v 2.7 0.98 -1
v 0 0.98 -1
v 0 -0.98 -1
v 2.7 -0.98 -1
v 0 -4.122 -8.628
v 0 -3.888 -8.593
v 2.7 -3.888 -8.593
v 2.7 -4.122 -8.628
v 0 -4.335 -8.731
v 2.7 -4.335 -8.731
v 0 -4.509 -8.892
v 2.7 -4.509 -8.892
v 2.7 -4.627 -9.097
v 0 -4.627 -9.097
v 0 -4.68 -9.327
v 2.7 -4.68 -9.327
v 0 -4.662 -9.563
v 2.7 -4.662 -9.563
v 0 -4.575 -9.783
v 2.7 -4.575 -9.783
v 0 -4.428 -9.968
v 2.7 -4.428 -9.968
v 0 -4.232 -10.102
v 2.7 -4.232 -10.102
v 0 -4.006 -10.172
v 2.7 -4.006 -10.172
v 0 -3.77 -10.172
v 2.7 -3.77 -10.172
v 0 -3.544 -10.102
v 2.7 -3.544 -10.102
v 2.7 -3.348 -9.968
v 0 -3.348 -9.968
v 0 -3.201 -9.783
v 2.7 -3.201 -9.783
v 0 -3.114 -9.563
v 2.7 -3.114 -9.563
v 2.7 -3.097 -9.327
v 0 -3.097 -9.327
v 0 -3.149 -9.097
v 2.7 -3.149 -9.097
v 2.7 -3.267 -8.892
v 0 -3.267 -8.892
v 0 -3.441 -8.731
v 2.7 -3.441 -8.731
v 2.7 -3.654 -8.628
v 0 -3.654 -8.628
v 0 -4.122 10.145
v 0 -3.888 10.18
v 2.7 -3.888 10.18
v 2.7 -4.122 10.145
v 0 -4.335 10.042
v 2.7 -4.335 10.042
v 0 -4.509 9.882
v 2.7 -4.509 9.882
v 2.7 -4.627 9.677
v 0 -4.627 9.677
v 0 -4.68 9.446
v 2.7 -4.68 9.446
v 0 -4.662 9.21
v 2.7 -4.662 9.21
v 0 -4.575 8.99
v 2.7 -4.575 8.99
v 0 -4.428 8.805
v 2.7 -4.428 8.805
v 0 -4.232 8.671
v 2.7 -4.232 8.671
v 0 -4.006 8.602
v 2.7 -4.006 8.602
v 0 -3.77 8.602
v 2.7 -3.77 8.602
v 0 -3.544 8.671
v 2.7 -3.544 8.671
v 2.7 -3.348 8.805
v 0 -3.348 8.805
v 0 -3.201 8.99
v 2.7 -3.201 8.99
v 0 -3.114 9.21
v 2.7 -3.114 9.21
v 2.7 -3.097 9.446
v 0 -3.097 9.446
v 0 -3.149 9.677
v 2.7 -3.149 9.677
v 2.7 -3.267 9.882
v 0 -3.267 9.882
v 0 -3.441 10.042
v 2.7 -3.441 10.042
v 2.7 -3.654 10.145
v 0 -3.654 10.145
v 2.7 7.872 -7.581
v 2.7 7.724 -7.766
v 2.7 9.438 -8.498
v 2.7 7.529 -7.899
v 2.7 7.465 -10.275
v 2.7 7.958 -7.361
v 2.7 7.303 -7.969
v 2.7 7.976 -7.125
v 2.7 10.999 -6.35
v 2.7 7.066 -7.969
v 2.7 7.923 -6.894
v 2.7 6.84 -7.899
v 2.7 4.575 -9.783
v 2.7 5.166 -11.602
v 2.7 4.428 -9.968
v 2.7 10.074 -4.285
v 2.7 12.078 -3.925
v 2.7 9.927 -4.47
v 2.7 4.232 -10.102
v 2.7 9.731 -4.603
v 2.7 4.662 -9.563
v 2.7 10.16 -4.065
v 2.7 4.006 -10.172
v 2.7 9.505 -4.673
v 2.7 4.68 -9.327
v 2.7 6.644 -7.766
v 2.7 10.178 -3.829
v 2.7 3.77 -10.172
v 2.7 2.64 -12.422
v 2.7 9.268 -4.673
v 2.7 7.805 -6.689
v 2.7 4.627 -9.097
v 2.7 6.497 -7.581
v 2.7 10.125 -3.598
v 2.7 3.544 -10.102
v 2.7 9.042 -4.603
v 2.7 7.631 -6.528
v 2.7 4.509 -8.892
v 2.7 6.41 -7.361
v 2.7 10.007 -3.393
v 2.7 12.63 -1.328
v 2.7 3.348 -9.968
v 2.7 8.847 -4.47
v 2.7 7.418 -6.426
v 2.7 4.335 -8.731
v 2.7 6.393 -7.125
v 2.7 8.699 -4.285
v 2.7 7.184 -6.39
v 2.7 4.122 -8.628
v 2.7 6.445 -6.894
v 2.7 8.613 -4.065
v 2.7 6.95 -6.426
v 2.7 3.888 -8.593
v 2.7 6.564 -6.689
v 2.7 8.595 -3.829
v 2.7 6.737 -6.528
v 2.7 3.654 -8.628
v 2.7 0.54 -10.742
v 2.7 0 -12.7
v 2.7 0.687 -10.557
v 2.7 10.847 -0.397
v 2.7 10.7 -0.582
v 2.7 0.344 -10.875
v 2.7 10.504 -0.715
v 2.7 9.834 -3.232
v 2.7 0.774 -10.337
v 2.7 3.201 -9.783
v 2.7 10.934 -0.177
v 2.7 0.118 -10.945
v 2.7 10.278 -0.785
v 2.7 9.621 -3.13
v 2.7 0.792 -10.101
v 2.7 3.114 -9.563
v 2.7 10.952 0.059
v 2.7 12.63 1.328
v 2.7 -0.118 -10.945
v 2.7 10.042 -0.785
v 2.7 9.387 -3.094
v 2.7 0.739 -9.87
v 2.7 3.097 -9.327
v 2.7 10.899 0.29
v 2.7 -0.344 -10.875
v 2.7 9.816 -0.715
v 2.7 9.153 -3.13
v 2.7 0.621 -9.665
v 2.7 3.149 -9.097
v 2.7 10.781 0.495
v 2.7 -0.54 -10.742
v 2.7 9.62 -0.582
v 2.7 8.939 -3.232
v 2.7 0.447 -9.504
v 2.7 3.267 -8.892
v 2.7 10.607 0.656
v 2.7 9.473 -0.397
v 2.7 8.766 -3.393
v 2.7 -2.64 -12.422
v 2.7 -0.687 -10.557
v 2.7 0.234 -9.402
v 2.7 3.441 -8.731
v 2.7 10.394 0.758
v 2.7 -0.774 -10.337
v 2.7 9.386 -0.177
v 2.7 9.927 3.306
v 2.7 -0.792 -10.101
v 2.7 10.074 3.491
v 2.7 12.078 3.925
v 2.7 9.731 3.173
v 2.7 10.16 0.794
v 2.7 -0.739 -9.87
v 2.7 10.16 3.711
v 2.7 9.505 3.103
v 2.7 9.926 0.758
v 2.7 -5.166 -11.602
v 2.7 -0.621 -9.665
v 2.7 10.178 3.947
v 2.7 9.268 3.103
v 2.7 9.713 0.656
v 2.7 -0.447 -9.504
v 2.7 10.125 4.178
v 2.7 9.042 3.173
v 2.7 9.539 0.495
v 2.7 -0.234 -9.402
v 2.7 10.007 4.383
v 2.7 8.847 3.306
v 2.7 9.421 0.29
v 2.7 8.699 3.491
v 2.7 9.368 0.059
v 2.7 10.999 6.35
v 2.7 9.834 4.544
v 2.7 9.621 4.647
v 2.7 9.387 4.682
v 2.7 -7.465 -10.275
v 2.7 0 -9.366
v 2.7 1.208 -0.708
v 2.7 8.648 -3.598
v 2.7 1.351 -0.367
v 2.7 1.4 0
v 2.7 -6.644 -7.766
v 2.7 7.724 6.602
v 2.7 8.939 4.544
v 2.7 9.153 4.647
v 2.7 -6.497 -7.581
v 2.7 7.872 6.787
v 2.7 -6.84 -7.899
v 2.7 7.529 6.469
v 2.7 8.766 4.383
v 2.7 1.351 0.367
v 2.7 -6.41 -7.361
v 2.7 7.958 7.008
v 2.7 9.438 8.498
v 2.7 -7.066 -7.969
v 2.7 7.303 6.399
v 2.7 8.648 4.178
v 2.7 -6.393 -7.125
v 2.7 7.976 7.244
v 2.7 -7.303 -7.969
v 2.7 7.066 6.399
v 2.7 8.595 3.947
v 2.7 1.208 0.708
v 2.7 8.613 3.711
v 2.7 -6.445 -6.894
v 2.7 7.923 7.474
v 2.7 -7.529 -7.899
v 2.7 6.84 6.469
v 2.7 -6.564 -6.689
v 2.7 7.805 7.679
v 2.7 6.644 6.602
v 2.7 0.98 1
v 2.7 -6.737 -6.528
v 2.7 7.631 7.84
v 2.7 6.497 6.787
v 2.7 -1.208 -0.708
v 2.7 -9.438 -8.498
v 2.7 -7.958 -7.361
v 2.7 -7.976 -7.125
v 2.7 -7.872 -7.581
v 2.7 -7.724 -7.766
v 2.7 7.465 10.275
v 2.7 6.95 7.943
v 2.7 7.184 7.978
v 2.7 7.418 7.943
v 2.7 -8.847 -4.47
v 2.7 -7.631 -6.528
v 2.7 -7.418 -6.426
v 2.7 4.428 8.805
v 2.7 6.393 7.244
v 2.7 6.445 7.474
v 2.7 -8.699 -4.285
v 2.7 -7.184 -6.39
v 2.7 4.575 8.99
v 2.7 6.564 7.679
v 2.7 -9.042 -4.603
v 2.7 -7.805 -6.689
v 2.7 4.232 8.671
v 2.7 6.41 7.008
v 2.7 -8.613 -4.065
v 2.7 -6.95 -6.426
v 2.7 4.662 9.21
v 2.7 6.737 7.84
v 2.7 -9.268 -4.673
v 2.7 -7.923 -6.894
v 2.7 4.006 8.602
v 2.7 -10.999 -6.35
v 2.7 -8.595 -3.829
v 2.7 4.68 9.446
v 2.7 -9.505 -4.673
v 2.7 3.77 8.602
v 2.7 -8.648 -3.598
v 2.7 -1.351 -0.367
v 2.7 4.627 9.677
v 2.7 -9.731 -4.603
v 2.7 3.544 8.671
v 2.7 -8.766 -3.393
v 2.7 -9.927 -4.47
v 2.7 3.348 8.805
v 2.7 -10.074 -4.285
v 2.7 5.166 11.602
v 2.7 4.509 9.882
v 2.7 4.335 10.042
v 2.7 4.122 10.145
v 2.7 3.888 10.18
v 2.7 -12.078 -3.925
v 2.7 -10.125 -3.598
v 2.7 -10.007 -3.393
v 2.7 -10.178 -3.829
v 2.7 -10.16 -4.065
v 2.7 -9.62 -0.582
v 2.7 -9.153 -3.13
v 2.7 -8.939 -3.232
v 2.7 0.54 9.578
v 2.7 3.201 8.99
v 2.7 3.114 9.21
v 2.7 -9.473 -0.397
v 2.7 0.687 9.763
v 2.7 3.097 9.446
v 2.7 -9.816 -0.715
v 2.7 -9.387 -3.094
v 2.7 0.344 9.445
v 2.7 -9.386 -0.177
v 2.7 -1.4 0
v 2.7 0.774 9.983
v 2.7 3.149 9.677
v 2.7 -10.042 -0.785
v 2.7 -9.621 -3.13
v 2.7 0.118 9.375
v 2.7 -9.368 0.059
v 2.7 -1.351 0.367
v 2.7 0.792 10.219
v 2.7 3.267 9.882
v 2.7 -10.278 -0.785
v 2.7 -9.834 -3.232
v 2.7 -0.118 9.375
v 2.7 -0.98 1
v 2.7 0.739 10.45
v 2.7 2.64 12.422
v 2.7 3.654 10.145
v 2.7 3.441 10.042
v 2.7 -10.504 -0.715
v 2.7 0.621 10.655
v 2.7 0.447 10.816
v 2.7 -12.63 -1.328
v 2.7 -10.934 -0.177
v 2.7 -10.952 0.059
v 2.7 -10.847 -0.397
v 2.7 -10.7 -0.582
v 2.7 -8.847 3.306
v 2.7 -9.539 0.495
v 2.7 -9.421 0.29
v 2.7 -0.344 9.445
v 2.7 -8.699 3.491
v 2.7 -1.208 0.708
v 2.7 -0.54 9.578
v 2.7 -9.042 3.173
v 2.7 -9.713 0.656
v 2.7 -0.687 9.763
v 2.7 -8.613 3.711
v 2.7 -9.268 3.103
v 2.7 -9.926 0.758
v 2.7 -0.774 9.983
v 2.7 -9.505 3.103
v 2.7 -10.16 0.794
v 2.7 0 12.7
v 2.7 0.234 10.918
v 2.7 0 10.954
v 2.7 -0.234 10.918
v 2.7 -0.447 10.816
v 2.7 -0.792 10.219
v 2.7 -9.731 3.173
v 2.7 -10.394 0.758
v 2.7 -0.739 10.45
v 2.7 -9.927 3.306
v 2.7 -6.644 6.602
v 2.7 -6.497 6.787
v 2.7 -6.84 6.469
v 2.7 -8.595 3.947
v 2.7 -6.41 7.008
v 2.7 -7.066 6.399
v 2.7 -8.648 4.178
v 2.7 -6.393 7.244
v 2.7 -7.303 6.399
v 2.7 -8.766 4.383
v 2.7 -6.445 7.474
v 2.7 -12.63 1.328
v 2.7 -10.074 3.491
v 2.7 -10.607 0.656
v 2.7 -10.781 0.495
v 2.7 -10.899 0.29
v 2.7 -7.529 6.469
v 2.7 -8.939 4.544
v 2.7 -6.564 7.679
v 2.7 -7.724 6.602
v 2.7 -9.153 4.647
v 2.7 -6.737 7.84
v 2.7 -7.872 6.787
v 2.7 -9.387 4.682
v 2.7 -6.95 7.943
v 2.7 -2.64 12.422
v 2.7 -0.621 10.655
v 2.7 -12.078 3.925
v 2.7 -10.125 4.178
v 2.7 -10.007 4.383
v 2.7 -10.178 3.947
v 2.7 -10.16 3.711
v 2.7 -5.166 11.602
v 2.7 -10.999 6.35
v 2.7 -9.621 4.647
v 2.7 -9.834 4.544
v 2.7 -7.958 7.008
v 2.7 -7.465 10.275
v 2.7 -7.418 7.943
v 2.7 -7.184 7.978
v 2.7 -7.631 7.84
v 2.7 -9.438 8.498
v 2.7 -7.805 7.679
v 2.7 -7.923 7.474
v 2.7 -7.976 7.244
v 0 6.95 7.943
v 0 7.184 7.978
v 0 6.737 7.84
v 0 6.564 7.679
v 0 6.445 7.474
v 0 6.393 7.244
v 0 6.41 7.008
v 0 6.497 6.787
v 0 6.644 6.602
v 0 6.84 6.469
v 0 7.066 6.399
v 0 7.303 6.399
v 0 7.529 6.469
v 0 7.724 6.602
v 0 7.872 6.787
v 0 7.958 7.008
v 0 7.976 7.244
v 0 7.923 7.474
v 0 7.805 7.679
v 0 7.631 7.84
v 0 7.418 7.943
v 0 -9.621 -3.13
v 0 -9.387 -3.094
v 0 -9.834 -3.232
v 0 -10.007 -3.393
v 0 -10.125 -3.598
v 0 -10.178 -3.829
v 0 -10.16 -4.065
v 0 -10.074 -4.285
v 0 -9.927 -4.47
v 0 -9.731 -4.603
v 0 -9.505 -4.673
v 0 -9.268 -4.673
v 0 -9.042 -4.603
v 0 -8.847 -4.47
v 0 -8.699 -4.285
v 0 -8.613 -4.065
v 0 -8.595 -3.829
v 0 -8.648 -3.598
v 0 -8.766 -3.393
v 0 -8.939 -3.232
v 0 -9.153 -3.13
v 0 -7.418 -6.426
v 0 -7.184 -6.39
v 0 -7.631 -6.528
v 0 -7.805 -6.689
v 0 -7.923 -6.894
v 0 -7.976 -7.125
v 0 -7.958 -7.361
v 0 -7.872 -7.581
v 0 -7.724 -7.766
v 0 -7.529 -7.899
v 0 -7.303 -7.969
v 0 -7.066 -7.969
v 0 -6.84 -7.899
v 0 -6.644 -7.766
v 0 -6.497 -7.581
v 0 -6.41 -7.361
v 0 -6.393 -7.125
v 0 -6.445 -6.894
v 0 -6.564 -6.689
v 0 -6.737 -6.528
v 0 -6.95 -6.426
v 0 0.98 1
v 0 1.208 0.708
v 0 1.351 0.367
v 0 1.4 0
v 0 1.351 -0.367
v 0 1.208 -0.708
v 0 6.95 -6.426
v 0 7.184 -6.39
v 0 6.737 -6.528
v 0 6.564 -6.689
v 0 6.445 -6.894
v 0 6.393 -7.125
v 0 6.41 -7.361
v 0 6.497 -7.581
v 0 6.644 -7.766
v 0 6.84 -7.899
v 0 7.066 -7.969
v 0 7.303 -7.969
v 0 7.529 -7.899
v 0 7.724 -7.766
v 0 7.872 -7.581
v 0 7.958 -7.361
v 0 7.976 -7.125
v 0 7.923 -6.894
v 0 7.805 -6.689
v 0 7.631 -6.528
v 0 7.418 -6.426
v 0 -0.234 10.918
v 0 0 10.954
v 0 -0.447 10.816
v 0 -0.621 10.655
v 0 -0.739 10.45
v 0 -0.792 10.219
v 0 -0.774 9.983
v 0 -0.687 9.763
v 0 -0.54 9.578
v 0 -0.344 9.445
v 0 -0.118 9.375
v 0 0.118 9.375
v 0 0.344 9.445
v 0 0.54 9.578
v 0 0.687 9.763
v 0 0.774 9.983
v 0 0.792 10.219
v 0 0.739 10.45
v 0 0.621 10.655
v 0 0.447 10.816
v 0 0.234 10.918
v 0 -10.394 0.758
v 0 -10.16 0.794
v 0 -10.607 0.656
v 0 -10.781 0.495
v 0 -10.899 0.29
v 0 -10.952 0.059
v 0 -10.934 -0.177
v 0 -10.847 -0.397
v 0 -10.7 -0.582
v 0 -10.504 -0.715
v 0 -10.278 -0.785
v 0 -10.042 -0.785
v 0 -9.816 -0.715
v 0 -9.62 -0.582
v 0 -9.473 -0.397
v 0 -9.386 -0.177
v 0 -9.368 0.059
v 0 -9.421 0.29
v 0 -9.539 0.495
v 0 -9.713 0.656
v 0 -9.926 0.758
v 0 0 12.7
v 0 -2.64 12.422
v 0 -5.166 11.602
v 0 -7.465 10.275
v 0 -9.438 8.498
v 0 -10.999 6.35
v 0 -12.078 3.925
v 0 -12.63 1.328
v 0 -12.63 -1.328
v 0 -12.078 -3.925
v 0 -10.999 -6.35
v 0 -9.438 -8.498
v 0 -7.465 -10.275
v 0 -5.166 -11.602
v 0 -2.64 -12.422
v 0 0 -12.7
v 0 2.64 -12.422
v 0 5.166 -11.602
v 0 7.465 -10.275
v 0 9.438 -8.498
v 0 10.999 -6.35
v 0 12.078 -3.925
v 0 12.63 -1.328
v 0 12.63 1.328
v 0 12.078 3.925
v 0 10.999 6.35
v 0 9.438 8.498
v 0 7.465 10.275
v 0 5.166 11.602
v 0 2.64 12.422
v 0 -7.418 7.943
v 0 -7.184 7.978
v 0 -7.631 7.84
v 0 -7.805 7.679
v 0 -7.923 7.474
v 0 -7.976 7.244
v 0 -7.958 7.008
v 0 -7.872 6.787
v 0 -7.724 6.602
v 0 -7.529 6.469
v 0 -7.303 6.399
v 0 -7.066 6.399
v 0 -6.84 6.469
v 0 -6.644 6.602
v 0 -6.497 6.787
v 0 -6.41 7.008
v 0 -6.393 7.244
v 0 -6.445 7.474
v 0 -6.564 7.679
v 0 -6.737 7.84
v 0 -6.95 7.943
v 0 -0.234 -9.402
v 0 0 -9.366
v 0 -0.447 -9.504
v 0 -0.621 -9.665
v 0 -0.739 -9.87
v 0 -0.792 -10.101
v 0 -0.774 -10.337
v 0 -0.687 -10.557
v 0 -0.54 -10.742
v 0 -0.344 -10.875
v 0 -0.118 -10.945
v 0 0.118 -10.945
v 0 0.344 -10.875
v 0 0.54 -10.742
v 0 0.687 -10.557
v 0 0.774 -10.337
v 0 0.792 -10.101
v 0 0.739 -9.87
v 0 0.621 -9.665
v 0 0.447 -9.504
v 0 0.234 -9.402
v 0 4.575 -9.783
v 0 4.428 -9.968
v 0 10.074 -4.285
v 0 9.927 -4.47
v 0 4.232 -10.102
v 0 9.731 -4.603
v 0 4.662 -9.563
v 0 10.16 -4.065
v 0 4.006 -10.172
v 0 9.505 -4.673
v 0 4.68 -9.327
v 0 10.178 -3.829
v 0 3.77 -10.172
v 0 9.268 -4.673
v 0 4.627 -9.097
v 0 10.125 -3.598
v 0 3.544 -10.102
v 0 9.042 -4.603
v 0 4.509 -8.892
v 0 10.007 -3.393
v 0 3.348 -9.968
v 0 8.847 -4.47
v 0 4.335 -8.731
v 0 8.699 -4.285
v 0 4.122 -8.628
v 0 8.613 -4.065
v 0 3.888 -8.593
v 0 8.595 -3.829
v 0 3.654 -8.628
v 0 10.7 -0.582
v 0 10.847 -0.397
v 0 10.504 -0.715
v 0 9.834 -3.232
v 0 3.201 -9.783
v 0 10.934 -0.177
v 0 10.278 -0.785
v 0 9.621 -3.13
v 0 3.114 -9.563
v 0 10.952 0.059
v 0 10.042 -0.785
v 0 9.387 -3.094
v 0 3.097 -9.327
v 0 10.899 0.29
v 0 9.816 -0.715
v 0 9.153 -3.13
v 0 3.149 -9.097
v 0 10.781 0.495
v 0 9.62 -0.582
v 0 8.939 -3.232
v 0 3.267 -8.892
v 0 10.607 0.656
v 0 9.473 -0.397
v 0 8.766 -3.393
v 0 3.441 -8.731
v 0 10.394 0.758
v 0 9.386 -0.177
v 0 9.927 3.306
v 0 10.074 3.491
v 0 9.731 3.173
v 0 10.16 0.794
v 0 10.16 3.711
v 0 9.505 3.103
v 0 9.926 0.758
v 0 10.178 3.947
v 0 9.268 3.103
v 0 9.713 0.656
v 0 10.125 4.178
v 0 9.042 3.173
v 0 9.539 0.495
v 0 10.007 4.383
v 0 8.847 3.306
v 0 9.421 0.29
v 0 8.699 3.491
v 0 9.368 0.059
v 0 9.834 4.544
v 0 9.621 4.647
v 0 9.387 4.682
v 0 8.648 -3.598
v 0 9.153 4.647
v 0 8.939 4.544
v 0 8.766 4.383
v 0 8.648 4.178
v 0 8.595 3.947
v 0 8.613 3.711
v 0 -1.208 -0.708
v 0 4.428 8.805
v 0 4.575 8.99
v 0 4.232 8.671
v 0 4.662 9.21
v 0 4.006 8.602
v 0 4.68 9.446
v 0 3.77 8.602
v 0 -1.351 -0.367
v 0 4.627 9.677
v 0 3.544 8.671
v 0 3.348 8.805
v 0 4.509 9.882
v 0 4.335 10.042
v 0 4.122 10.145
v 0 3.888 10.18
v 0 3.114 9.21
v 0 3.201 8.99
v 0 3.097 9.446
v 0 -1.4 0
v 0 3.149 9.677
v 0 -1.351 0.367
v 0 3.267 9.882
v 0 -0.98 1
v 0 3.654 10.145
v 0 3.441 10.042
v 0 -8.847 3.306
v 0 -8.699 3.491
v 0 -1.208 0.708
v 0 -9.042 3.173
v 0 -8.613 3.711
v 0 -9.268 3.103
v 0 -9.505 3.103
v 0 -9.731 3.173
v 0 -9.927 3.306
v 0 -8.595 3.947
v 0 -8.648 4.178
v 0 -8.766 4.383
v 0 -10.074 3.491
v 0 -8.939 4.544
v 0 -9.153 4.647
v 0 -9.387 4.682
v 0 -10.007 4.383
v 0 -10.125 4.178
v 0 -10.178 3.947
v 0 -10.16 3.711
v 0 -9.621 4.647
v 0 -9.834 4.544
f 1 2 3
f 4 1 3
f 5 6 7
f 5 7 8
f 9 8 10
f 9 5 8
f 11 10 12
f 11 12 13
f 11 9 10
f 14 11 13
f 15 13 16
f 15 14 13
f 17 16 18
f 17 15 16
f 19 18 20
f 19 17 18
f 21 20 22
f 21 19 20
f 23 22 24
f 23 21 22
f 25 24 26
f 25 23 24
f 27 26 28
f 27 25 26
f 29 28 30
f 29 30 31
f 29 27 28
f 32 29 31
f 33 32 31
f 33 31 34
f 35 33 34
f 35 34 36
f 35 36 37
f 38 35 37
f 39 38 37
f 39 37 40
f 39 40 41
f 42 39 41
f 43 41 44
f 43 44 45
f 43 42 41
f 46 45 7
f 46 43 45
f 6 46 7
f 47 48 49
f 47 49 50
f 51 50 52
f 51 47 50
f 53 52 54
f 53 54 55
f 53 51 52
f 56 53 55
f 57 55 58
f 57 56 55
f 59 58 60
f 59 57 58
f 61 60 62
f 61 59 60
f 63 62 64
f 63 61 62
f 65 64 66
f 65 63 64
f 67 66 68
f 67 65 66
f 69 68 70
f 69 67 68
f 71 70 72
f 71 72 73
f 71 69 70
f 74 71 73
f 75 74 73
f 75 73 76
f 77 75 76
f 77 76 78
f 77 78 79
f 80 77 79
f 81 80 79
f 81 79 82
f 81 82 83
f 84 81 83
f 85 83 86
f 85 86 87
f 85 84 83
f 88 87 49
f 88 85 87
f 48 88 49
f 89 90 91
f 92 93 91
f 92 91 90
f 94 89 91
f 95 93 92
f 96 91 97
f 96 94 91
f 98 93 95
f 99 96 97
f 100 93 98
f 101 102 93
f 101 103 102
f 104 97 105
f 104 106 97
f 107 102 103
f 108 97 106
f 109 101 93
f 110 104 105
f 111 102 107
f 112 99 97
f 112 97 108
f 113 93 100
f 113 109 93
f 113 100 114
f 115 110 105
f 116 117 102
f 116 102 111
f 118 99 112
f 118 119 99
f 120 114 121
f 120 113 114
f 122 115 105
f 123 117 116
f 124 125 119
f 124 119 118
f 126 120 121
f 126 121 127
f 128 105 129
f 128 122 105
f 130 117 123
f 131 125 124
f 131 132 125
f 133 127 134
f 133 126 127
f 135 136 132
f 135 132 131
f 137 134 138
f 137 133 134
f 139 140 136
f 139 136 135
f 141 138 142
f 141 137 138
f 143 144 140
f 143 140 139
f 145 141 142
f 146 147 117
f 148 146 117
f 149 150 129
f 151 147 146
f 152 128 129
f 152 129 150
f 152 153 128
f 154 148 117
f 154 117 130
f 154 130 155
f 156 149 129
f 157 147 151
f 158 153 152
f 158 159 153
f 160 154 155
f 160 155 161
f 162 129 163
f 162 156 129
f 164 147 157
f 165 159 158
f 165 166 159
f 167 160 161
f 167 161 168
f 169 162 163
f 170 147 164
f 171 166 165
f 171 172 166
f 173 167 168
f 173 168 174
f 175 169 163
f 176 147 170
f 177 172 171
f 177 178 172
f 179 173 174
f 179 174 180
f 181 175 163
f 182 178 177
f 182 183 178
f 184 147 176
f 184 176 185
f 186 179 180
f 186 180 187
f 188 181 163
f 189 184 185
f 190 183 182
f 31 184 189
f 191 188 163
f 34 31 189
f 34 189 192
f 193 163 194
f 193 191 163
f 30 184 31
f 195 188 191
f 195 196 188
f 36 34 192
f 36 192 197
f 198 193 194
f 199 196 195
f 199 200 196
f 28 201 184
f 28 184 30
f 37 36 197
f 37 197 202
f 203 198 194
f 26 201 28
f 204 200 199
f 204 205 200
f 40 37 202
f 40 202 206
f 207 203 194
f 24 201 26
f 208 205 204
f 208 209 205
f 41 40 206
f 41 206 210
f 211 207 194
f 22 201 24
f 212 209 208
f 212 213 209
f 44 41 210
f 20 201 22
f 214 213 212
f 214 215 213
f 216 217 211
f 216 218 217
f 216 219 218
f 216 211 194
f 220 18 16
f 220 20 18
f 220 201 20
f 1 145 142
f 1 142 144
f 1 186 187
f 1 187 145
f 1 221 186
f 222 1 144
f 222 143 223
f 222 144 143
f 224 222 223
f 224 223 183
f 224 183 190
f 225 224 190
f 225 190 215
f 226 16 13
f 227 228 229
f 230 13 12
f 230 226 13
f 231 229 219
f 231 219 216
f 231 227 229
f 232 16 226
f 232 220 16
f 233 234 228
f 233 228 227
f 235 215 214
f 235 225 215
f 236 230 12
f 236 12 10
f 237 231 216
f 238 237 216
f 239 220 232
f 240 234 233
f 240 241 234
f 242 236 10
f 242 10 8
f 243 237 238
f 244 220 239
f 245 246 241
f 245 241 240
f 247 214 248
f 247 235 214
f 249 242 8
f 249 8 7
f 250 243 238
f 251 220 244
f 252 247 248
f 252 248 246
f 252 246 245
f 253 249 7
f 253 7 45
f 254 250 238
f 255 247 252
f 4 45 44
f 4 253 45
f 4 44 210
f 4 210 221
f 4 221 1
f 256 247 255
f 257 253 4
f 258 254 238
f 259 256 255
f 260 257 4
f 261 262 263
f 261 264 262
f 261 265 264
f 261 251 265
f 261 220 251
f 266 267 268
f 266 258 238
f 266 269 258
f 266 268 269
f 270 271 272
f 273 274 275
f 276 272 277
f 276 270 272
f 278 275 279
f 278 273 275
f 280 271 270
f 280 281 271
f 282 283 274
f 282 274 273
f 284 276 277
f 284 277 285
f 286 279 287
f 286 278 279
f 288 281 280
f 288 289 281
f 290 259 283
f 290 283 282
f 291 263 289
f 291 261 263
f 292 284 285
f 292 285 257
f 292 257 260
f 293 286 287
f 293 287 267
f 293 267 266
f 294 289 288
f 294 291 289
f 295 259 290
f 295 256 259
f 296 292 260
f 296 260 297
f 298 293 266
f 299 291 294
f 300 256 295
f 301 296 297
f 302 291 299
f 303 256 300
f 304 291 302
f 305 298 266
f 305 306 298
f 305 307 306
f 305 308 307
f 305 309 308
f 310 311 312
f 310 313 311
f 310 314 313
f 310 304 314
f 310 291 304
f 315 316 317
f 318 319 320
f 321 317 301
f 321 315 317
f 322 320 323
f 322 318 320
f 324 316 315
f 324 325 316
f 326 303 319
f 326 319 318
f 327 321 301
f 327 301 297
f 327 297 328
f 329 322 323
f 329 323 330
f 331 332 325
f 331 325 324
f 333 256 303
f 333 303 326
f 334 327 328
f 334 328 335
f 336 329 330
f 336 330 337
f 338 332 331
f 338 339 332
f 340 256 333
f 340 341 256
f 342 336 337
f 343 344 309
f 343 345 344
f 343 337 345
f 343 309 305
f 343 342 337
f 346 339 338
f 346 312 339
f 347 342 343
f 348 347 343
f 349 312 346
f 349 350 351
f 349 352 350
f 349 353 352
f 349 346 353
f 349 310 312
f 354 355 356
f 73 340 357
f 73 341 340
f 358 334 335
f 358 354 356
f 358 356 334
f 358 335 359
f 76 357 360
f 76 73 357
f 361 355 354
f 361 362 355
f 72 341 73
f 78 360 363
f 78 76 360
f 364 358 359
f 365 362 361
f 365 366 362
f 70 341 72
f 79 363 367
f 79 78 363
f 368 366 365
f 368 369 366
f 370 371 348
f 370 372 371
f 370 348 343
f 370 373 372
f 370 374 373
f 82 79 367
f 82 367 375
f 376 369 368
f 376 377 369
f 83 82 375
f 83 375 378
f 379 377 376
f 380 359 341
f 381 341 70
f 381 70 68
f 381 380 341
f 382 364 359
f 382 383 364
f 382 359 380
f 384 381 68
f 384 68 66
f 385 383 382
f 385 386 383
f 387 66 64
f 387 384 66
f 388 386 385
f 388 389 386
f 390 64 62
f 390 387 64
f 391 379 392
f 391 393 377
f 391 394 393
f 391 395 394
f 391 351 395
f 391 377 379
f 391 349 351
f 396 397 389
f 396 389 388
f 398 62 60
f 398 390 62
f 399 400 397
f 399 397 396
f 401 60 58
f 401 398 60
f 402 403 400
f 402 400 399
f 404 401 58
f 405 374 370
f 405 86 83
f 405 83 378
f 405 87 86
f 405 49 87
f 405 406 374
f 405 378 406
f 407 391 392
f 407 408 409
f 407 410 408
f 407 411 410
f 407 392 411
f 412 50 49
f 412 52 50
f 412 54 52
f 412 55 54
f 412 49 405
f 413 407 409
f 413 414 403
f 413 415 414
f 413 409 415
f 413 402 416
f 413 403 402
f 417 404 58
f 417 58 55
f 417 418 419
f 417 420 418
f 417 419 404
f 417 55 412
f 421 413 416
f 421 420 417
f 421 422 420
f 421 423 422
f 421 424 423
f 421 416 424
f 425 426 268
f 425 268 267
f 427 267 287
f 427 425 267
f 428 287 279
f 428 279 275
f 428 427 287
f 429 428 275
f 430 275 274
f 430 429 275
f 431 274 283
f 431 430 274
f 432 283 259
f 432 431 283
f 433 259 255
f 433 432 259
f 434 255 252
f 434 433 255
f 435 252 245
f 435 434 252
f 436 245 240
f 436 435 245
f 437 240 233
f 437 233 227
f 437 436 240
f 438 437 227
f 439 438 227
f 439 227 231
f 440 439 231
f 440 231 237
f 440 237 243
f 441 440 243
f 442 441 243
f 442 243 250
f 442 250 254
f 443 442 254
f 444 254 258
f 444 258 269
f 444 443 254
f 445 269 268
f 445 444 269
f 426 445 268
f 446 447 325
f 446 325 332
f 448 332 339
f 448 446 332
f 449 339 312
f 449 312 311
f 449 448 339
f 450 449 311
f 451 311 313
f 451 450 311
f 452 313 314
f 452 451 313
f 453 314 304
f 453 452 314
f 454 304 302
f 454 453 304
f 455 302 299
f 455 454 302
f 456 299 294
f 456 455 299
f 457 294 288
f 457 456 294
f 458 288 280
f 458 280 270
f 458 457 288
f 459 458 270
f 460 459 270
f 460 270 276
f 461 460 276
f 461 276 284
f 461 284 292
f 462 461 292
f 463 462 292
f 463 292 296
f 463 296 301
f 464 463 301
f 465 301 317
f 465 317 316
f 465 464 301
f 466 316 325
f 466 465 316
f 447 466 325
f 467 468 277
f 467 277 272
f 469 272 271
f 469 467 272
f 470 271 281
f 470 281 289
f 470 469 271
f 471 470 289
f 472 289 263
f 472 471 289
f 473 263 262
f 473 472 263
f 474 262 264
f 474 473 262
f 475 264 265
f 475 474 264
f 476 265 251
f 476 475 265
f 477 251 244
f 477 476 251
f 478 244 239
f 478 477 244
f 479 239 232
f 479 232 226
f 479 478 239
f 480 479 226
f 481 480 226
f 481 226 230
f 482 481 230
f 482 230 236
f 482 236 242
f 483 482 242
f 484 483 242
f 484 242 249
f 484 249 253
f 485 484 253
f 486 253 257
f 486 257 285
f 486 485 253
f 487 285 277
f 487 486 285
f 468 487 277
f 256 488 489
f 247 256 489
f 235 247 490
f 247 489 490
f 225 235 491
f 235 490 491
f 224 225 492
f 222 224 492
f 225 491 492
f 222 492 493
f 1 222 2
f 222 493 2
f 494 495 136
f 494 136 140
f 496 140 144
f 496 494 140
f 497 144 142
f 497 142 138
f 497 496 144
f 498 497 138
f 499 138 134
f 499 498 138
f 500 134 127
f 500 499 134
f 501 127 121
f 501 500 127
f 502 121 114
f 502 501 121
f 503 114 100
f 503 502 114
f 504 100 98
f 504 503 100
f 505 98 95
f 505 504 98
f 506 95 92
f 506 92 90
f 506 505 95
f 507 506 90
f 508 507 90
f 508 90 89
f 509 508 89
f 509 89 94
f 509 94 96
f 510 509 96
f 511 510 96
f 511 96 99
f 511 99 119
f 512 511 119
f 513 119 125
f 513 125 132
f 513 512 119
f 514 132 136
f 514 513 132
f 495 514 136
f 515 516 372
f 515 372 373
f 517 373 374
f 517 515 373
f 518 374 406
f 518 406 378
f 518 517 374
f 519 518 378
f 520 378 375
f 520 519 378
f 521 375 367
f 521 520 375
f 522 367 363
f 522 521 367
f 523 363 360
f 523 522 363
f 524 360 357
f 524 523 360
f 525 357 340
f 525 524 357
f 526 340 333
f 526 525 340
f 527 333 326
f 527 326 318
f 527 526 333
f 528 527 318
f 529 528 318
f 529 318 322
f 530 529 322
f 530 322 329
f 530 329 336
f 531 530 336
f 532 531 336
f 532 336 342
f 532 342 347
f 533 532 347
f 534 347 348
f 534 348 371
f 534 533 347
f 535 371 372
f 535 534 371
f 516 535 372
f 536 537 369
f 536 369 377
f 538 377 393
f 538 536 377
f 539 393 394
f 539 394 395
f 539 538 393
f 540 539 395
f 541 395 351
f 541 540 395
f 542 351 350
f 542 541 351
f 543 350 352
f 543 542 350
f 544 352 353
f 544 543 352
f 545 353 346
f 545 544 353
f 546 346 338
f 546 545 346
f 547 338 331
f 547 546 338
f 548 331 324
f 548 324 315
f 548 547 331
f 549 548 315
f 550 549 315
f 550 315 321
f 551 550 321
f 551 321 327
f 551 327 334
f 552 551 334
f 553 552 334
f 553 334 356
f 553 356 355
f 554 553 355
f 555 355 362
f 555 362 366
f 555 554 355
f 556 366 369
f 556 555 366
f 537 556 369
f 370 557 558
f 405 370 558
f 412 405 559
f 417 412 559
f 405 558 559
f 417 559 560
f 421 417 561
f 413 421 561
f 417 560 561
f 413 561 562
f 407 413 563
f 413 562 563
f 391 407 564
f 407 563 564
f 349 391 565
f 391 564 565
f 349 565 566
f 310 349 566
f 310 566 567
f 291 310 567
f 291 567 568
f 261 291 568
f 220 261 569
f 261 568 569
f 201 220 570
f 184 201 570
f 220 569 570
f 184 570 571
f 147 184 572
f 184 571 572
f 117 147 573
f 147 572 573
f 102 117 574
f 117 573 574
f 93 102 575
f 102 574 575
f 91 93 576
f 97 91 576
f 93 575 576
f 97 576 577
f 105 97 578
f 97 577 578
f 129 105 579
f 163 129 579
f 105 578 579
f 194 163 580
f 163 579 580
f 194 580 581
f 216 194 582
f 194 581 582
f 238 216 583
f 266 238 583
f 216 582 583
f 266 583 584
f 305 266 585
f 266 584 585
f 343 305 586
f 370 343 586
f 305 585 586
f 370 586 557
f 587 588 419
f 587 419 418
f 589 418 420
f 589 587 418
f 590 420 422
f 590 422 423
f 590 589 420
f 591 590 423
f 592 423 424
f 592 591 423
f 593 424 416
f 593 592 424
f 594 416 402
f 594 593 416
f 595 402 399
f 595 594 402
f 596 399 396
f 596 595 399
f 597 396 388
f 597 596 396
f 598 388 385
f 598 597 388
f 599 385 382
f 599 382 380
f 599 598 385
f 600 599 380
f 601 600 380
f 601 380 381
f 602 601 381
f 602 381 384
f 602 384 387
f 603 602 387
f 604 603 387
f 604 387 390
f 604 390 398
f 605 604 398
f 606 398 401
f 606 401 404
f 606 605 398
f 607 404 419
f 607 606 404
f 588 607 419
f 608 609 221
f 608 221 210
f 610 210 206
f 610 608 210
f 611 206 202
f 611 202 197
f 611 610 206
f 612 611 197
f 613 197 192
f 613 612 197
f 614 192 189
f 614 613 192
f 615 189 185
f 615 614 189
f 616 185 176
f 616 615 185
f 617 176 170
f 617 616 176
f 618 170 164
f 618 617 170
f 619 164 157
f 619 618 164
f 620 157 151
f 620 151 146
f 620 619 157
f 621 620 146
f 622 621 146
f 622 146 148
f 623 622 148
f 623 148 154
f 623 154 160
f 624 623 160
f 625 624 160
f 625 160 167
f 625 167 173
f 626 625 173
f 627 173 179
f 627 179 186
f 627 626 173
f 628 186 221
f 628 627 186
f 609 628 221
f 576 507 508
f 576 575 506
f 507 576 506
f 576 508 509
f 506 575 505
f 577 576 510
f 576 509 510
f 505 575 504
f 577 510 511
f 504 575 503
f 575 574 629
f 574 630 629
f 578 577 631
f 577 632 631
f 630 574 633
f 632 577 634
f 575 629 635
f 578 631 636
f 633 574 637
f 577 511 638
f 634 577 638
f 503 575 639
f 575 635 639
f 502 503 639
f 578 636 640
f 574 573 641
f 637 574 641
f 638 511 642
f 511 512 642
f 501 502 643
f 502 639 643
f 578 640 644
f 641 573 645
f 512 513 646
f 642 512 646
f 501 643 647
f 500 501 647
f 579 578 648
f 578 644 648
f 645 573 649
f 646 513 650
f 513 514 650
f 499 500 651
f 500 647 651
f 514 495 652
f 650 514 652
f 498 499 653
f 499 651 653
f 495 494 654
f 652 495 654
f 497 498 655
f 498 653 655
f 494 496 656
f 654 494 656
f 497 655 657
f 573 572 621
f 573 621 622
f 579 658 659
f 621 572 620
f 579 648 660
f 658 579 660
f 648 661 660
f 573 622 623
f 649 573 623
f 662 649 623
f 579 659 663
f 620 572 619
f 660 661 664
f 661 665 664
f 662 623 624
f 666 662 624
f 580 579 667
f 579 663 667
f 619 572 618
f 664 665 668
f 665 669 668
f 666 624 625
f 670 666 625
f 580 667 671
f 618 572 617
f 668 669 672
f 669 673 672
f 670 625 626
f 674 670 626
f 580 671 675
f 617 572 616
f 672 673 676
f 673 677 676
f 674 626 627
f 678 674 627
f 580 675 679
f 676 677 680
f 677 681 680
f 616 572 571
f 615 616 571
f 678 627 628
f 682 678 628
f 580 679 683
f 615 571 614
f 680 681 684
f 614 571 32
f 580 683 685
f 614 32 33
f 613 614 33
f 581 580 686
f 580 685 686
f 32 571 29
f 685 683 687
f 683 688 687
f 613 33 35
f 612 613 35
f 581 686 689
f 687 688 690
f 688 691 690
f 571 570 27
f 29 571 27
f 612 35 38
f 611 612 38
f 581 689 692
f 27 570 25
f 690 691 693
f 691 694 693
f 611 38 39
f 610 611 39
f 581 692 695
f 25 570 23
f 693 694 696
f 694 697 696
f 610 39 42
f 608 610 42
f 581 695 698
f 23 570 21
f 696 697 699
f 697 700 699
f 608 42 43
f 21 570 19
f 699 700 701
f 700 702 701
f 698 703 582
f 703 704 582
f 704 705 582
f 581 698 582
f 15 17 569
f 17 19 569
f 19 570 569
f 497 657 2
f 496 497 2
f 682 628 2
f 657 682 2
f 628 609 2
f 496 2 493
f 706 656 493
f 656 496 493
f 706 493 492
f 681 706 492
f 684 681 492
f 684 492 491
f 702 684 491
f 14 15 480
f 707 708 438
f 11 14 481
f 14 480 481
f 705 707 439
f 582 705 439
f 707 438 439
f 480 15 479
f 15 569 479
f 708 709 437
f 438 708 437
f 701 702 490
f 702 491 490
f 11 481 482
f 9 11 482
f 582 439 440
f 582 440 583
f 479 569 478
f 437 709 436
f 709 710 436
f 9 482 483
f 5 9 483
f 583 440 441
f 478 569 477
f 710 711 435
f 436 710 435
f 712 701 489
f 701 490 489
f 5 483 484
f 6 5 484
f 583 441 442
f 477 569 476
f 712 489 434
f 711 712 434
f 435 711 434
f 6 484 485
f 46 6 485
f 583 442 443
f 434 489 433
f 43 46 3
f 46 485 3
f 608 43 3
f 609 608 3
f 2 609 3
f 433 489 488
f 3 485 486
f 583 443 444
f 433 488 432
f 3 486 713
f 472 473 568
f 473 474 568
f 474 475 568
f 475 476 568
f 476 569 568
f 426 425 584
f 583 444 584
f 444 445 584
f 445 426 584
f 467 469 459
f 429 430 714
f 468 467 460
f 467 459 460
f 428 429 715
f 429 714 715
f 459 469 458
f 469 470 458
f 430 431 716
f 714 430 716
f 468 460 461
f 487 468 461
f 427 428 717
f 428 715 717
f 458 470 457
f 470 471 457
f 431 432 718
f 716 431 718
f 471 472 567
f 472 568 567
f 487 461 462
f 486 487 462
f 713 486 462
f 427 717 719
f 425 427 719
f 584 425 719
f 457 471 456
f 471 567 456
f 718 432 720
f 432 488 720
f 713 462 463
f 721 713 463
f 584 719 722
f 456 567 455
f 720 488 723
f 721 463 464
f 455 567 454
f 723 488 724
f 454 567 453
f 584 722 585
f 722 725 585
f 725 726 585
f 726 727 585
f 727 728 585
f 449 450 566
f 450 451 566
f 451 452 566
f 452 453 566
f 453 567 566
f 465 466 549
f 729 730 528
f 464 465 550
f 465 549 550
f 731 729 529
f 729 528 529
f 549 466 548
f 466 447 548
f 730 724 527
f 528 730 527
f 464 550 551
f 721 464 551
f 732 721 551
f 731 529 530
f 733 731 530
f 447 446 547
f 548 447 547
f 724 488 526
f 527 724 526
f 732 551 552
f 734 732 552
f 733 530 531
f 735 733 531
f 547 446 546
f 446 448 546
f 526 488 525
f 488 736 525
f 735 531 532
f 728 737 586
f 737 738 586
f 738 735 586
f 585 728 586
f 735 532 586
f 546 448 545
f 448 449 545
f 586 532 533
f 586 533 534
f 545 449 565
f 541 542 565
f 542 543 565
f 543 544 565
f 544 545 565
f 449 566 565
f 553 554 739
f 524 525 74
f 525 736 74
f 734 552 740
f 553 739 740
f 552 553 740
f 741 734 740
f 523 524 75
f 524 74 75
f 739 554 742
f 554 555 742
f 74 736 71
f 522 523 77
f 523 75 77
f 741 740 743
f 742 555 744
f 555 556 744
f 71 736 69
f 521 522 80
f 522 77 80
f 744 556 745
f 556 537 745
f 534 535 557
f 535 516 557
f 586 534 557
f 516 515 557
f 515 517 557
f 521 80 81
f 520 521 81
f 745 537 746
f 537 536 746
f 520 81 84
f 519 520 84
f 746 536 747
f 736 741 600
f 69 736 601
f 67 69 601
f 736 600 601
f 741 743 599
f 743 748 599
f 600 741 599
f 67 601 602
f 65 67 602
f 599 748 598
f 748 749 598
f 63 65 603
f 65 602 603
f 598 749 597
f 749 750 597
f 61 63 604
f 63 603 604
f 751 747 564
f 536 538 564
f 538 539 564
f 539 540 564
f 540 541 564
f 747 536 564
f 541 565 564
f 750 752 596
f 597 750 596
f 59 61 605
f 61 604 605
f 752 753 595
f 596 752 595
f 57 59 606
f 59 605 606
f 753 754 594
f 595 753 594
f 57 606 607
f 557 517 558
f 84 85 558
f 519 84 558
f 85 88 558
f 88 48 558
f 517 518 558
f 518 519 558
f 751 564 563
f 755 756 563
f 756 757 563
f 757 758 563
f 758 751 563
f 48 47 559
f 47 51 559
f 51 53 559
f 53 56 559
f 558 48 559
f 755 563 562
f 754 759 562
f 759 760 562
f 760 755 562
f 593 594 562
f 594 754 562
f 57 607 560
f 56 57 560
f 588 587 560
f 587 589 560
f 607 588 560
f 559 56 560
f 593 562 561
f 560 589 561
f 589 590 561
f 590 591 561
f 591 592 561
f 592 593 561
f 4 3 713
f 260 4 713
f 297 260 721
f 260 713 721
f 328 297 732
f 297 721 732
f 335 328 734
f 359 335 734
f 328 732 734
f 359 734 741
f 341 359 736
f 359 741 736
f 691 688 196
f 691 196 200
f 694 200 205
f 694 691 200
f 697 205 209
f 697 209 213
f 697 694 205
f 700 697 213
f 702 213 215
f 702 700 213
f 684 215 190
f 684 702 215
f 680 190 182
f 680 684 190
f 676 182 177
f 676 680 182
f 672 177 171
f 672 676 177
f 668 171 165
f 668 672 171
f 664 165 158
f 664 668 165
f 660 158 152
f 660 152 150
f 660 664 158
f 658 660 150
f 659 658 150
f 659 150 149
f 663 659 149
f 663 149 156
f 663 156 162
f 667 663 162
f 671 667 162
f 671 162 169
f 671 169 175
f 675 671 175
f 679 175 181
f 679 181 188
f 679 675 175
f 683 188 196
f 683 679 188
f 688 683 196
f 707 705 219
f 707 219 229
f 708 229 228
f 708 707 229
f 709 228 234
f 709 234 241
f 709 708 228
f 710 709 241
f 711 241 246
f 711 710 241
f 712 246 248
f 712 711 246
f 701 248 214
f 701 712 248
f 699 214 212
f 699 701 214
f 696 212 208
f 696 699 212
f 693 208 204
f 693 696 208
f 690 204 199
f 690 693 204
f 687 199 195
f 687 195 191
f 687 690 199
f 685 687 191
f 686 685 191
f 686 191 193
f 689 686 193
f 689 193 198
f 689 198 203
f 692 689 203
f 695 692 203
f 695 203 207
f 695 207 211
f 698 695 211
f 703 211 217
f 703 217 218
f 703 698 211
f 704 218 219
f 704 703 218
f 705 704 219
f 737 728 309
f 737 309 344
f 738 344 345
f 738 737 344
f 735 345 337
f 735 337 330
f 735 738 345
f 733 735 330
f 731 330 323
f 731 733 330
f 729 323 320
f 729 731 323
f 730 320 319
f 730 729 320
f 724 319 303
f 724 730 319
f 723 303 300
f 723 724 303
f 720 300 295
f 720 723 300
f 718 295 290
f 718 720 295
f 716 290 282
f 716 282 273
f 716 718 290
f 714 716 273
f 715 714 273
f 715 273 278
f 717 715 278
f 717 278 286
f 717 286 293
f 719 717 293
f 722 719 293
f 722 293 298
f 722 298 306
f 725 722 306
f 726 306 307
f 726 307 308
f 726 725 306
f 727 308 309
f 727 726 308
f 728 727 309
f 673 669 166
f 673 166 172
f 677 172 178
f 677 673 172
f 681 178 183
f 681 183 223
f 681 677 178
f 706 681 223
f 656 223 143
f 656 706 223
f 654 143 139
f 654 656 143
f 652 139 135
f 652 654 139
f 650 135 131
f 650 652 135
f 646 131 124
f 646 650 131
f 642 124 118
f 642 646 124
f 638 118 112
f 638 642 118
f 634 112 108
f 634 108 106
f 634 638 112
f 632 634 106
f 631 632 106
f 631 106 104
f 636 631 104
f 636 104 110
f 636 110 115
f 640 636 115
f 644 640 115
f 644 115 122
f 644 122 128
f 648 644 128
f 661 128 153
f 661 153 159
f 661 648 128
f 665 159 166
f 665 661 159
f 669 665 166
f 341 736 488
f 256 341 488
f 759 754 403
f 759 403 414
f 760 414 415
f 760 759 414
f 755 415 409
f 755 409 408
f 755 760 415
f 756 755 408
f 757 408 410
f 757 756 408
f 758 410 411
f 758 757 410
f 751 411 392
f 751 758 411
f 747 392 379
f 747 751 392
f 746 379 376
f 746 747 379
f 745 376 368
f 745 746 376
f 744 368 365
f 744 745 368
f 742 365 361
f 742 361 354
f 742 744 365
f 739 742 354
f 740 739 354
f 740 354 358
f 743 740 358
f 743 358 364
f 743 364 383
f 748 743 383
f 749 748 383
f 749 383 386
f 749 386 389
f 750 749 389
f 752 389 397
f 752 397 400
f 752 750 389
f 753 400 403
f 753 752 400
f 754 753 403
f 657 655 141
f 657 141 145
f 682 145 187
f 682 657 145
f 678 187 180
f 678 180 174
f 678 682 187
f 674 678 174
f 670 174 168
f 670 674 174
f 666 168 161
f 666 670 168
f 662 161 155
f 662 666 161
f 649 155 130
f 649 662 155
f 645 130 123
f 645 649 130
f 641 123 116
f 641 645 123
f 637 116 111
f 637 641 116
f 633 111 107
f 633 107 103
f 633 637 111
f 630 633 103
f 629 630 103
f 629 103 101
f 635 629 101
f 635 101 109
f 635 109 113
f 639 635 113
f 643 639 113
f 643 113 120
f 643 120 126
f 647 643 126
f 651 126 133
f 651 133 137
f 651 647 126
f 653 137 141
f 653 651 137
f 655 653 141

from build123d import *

# Parameters (mm, degrees)
SKETCH1_R   = 12.7
SKETCH1_R_2 = 0.79375
BASE_DEPTH  = 2.7


with BuildPart() as part:
    # Sketch1 → Base (new body)
    with BuildSketch(Plane(origin=(0, 0, 0), x_dir=(0, 0, -1), z_dir=(1, 0, 0))):
        with Locations(Location((0, 0, 0), (0, 0, 180))):
            Circle(SKETCH1_R)
        with Locations(Location((0, 10.16, 0), (0, 0, 180))):
            Circle(SKETCH1_R_2, mode=Mode.SUBTRACT)
        with Locations(Location((3.888063673, 9.38661605, 0), (0, 0, 180))):
            Circle(SKETCH1_R_2, mode=Mode.SUBTRACT)
        with Locations(Location((7.184204897, 7.184204897, 0), (0, 0, 180))):
            Circle(SKETCH1_R_2, mode=Mode.SUBTRACT)
        with Locations(Location((9.38661605, 3.888063673, 0), (0, 0, 180))):
            Circle(SKETCH1_R_2, mode=Mode.SUBTRACT)
        with Locations(Location((10.16, 0, 0), (0, 0, 180))):
            Circle(SKETCH1_R_2, mode=Mode.SUBTRACT)
        with Locations(Location((9.38661605, -3.888063673, 0), (0, 0, 180))):
            Circle(SKETCH1_R_2, mode=Mode.SUBTRACT)
        with Locations(Location((7.184204897, -7.184204897, 0), (0, 0, 180))):
            Circle(SKETCH1_R_2, mode=Mode.SUBTRACT)
        with Locations(Location((3.888063673, -9.38661605, 0), (0, 0, 180))):
            Circle(SKETCH1_R_2, mode=Mode.SUBTRACT)
        with Locations(Location((0, -10.16, 0), (0, 0, 180))):
            Circle(SKETCH1_R_2, mode=Mode.SUBTRACT)
        with Locations(Location((-3.888063673, -9.38661605, 0), (0, 0, 180))):
            Circle(SKETCH1_R_2, mode=Mode.SUBTRACT)
        with Locations(Location((-7.184204897, -7.184204897, 0), (0, 0, 180))):
            Circle(SKETCH1_R_2, mode=Mode.SUBTRACT)
        with Locations(Location((-9.38661605, -3.888063673, 0), (0, 0, 180))):
            Circle(SKETCH1_R_2, mode=Mode.SUBTRACT)
        with Locations(Location((-10.16, 0, 0), (0, 0, 180))):
            Circle(SKETCH1_R_2, mode=Mode.SUBTRACT)
        with Locations(Location((-9.38661605, 3.888063673, 0), (0, 0, 180))):
            Circle(SKETCH1_R_2, mode=Mode.SUBTRACT)
        with Locations(Location((-7.184204897, 7.184204897, 0), (0, 0, 180))):
            Circle(SKETCH1_R_2, mode=Mode.SUBTRACT)
        with Locations(Location((-3.888063673, 9.38661605, 0), (0, 0, 180))):
            Circle(SKETCH1_R_2, mode=Mode.SUBTRACT)
        with BuildLine():
            Line((1, 0.979795897), (1, -0.979795897))
            ThreePointArc((1, -0.979795897), (0, -1.4), (-1, -0.979795897))
            Line((-1, -0.979795897), (-1, 0.979795897))
            ThreePointArc((-1, 0.979795897), (0, 1.4), (1, 0.979795897))
        make_face(mode=Mode.SUBTRACT)
    extrude(amount=BASE_DEPTH)


solid = part.part
